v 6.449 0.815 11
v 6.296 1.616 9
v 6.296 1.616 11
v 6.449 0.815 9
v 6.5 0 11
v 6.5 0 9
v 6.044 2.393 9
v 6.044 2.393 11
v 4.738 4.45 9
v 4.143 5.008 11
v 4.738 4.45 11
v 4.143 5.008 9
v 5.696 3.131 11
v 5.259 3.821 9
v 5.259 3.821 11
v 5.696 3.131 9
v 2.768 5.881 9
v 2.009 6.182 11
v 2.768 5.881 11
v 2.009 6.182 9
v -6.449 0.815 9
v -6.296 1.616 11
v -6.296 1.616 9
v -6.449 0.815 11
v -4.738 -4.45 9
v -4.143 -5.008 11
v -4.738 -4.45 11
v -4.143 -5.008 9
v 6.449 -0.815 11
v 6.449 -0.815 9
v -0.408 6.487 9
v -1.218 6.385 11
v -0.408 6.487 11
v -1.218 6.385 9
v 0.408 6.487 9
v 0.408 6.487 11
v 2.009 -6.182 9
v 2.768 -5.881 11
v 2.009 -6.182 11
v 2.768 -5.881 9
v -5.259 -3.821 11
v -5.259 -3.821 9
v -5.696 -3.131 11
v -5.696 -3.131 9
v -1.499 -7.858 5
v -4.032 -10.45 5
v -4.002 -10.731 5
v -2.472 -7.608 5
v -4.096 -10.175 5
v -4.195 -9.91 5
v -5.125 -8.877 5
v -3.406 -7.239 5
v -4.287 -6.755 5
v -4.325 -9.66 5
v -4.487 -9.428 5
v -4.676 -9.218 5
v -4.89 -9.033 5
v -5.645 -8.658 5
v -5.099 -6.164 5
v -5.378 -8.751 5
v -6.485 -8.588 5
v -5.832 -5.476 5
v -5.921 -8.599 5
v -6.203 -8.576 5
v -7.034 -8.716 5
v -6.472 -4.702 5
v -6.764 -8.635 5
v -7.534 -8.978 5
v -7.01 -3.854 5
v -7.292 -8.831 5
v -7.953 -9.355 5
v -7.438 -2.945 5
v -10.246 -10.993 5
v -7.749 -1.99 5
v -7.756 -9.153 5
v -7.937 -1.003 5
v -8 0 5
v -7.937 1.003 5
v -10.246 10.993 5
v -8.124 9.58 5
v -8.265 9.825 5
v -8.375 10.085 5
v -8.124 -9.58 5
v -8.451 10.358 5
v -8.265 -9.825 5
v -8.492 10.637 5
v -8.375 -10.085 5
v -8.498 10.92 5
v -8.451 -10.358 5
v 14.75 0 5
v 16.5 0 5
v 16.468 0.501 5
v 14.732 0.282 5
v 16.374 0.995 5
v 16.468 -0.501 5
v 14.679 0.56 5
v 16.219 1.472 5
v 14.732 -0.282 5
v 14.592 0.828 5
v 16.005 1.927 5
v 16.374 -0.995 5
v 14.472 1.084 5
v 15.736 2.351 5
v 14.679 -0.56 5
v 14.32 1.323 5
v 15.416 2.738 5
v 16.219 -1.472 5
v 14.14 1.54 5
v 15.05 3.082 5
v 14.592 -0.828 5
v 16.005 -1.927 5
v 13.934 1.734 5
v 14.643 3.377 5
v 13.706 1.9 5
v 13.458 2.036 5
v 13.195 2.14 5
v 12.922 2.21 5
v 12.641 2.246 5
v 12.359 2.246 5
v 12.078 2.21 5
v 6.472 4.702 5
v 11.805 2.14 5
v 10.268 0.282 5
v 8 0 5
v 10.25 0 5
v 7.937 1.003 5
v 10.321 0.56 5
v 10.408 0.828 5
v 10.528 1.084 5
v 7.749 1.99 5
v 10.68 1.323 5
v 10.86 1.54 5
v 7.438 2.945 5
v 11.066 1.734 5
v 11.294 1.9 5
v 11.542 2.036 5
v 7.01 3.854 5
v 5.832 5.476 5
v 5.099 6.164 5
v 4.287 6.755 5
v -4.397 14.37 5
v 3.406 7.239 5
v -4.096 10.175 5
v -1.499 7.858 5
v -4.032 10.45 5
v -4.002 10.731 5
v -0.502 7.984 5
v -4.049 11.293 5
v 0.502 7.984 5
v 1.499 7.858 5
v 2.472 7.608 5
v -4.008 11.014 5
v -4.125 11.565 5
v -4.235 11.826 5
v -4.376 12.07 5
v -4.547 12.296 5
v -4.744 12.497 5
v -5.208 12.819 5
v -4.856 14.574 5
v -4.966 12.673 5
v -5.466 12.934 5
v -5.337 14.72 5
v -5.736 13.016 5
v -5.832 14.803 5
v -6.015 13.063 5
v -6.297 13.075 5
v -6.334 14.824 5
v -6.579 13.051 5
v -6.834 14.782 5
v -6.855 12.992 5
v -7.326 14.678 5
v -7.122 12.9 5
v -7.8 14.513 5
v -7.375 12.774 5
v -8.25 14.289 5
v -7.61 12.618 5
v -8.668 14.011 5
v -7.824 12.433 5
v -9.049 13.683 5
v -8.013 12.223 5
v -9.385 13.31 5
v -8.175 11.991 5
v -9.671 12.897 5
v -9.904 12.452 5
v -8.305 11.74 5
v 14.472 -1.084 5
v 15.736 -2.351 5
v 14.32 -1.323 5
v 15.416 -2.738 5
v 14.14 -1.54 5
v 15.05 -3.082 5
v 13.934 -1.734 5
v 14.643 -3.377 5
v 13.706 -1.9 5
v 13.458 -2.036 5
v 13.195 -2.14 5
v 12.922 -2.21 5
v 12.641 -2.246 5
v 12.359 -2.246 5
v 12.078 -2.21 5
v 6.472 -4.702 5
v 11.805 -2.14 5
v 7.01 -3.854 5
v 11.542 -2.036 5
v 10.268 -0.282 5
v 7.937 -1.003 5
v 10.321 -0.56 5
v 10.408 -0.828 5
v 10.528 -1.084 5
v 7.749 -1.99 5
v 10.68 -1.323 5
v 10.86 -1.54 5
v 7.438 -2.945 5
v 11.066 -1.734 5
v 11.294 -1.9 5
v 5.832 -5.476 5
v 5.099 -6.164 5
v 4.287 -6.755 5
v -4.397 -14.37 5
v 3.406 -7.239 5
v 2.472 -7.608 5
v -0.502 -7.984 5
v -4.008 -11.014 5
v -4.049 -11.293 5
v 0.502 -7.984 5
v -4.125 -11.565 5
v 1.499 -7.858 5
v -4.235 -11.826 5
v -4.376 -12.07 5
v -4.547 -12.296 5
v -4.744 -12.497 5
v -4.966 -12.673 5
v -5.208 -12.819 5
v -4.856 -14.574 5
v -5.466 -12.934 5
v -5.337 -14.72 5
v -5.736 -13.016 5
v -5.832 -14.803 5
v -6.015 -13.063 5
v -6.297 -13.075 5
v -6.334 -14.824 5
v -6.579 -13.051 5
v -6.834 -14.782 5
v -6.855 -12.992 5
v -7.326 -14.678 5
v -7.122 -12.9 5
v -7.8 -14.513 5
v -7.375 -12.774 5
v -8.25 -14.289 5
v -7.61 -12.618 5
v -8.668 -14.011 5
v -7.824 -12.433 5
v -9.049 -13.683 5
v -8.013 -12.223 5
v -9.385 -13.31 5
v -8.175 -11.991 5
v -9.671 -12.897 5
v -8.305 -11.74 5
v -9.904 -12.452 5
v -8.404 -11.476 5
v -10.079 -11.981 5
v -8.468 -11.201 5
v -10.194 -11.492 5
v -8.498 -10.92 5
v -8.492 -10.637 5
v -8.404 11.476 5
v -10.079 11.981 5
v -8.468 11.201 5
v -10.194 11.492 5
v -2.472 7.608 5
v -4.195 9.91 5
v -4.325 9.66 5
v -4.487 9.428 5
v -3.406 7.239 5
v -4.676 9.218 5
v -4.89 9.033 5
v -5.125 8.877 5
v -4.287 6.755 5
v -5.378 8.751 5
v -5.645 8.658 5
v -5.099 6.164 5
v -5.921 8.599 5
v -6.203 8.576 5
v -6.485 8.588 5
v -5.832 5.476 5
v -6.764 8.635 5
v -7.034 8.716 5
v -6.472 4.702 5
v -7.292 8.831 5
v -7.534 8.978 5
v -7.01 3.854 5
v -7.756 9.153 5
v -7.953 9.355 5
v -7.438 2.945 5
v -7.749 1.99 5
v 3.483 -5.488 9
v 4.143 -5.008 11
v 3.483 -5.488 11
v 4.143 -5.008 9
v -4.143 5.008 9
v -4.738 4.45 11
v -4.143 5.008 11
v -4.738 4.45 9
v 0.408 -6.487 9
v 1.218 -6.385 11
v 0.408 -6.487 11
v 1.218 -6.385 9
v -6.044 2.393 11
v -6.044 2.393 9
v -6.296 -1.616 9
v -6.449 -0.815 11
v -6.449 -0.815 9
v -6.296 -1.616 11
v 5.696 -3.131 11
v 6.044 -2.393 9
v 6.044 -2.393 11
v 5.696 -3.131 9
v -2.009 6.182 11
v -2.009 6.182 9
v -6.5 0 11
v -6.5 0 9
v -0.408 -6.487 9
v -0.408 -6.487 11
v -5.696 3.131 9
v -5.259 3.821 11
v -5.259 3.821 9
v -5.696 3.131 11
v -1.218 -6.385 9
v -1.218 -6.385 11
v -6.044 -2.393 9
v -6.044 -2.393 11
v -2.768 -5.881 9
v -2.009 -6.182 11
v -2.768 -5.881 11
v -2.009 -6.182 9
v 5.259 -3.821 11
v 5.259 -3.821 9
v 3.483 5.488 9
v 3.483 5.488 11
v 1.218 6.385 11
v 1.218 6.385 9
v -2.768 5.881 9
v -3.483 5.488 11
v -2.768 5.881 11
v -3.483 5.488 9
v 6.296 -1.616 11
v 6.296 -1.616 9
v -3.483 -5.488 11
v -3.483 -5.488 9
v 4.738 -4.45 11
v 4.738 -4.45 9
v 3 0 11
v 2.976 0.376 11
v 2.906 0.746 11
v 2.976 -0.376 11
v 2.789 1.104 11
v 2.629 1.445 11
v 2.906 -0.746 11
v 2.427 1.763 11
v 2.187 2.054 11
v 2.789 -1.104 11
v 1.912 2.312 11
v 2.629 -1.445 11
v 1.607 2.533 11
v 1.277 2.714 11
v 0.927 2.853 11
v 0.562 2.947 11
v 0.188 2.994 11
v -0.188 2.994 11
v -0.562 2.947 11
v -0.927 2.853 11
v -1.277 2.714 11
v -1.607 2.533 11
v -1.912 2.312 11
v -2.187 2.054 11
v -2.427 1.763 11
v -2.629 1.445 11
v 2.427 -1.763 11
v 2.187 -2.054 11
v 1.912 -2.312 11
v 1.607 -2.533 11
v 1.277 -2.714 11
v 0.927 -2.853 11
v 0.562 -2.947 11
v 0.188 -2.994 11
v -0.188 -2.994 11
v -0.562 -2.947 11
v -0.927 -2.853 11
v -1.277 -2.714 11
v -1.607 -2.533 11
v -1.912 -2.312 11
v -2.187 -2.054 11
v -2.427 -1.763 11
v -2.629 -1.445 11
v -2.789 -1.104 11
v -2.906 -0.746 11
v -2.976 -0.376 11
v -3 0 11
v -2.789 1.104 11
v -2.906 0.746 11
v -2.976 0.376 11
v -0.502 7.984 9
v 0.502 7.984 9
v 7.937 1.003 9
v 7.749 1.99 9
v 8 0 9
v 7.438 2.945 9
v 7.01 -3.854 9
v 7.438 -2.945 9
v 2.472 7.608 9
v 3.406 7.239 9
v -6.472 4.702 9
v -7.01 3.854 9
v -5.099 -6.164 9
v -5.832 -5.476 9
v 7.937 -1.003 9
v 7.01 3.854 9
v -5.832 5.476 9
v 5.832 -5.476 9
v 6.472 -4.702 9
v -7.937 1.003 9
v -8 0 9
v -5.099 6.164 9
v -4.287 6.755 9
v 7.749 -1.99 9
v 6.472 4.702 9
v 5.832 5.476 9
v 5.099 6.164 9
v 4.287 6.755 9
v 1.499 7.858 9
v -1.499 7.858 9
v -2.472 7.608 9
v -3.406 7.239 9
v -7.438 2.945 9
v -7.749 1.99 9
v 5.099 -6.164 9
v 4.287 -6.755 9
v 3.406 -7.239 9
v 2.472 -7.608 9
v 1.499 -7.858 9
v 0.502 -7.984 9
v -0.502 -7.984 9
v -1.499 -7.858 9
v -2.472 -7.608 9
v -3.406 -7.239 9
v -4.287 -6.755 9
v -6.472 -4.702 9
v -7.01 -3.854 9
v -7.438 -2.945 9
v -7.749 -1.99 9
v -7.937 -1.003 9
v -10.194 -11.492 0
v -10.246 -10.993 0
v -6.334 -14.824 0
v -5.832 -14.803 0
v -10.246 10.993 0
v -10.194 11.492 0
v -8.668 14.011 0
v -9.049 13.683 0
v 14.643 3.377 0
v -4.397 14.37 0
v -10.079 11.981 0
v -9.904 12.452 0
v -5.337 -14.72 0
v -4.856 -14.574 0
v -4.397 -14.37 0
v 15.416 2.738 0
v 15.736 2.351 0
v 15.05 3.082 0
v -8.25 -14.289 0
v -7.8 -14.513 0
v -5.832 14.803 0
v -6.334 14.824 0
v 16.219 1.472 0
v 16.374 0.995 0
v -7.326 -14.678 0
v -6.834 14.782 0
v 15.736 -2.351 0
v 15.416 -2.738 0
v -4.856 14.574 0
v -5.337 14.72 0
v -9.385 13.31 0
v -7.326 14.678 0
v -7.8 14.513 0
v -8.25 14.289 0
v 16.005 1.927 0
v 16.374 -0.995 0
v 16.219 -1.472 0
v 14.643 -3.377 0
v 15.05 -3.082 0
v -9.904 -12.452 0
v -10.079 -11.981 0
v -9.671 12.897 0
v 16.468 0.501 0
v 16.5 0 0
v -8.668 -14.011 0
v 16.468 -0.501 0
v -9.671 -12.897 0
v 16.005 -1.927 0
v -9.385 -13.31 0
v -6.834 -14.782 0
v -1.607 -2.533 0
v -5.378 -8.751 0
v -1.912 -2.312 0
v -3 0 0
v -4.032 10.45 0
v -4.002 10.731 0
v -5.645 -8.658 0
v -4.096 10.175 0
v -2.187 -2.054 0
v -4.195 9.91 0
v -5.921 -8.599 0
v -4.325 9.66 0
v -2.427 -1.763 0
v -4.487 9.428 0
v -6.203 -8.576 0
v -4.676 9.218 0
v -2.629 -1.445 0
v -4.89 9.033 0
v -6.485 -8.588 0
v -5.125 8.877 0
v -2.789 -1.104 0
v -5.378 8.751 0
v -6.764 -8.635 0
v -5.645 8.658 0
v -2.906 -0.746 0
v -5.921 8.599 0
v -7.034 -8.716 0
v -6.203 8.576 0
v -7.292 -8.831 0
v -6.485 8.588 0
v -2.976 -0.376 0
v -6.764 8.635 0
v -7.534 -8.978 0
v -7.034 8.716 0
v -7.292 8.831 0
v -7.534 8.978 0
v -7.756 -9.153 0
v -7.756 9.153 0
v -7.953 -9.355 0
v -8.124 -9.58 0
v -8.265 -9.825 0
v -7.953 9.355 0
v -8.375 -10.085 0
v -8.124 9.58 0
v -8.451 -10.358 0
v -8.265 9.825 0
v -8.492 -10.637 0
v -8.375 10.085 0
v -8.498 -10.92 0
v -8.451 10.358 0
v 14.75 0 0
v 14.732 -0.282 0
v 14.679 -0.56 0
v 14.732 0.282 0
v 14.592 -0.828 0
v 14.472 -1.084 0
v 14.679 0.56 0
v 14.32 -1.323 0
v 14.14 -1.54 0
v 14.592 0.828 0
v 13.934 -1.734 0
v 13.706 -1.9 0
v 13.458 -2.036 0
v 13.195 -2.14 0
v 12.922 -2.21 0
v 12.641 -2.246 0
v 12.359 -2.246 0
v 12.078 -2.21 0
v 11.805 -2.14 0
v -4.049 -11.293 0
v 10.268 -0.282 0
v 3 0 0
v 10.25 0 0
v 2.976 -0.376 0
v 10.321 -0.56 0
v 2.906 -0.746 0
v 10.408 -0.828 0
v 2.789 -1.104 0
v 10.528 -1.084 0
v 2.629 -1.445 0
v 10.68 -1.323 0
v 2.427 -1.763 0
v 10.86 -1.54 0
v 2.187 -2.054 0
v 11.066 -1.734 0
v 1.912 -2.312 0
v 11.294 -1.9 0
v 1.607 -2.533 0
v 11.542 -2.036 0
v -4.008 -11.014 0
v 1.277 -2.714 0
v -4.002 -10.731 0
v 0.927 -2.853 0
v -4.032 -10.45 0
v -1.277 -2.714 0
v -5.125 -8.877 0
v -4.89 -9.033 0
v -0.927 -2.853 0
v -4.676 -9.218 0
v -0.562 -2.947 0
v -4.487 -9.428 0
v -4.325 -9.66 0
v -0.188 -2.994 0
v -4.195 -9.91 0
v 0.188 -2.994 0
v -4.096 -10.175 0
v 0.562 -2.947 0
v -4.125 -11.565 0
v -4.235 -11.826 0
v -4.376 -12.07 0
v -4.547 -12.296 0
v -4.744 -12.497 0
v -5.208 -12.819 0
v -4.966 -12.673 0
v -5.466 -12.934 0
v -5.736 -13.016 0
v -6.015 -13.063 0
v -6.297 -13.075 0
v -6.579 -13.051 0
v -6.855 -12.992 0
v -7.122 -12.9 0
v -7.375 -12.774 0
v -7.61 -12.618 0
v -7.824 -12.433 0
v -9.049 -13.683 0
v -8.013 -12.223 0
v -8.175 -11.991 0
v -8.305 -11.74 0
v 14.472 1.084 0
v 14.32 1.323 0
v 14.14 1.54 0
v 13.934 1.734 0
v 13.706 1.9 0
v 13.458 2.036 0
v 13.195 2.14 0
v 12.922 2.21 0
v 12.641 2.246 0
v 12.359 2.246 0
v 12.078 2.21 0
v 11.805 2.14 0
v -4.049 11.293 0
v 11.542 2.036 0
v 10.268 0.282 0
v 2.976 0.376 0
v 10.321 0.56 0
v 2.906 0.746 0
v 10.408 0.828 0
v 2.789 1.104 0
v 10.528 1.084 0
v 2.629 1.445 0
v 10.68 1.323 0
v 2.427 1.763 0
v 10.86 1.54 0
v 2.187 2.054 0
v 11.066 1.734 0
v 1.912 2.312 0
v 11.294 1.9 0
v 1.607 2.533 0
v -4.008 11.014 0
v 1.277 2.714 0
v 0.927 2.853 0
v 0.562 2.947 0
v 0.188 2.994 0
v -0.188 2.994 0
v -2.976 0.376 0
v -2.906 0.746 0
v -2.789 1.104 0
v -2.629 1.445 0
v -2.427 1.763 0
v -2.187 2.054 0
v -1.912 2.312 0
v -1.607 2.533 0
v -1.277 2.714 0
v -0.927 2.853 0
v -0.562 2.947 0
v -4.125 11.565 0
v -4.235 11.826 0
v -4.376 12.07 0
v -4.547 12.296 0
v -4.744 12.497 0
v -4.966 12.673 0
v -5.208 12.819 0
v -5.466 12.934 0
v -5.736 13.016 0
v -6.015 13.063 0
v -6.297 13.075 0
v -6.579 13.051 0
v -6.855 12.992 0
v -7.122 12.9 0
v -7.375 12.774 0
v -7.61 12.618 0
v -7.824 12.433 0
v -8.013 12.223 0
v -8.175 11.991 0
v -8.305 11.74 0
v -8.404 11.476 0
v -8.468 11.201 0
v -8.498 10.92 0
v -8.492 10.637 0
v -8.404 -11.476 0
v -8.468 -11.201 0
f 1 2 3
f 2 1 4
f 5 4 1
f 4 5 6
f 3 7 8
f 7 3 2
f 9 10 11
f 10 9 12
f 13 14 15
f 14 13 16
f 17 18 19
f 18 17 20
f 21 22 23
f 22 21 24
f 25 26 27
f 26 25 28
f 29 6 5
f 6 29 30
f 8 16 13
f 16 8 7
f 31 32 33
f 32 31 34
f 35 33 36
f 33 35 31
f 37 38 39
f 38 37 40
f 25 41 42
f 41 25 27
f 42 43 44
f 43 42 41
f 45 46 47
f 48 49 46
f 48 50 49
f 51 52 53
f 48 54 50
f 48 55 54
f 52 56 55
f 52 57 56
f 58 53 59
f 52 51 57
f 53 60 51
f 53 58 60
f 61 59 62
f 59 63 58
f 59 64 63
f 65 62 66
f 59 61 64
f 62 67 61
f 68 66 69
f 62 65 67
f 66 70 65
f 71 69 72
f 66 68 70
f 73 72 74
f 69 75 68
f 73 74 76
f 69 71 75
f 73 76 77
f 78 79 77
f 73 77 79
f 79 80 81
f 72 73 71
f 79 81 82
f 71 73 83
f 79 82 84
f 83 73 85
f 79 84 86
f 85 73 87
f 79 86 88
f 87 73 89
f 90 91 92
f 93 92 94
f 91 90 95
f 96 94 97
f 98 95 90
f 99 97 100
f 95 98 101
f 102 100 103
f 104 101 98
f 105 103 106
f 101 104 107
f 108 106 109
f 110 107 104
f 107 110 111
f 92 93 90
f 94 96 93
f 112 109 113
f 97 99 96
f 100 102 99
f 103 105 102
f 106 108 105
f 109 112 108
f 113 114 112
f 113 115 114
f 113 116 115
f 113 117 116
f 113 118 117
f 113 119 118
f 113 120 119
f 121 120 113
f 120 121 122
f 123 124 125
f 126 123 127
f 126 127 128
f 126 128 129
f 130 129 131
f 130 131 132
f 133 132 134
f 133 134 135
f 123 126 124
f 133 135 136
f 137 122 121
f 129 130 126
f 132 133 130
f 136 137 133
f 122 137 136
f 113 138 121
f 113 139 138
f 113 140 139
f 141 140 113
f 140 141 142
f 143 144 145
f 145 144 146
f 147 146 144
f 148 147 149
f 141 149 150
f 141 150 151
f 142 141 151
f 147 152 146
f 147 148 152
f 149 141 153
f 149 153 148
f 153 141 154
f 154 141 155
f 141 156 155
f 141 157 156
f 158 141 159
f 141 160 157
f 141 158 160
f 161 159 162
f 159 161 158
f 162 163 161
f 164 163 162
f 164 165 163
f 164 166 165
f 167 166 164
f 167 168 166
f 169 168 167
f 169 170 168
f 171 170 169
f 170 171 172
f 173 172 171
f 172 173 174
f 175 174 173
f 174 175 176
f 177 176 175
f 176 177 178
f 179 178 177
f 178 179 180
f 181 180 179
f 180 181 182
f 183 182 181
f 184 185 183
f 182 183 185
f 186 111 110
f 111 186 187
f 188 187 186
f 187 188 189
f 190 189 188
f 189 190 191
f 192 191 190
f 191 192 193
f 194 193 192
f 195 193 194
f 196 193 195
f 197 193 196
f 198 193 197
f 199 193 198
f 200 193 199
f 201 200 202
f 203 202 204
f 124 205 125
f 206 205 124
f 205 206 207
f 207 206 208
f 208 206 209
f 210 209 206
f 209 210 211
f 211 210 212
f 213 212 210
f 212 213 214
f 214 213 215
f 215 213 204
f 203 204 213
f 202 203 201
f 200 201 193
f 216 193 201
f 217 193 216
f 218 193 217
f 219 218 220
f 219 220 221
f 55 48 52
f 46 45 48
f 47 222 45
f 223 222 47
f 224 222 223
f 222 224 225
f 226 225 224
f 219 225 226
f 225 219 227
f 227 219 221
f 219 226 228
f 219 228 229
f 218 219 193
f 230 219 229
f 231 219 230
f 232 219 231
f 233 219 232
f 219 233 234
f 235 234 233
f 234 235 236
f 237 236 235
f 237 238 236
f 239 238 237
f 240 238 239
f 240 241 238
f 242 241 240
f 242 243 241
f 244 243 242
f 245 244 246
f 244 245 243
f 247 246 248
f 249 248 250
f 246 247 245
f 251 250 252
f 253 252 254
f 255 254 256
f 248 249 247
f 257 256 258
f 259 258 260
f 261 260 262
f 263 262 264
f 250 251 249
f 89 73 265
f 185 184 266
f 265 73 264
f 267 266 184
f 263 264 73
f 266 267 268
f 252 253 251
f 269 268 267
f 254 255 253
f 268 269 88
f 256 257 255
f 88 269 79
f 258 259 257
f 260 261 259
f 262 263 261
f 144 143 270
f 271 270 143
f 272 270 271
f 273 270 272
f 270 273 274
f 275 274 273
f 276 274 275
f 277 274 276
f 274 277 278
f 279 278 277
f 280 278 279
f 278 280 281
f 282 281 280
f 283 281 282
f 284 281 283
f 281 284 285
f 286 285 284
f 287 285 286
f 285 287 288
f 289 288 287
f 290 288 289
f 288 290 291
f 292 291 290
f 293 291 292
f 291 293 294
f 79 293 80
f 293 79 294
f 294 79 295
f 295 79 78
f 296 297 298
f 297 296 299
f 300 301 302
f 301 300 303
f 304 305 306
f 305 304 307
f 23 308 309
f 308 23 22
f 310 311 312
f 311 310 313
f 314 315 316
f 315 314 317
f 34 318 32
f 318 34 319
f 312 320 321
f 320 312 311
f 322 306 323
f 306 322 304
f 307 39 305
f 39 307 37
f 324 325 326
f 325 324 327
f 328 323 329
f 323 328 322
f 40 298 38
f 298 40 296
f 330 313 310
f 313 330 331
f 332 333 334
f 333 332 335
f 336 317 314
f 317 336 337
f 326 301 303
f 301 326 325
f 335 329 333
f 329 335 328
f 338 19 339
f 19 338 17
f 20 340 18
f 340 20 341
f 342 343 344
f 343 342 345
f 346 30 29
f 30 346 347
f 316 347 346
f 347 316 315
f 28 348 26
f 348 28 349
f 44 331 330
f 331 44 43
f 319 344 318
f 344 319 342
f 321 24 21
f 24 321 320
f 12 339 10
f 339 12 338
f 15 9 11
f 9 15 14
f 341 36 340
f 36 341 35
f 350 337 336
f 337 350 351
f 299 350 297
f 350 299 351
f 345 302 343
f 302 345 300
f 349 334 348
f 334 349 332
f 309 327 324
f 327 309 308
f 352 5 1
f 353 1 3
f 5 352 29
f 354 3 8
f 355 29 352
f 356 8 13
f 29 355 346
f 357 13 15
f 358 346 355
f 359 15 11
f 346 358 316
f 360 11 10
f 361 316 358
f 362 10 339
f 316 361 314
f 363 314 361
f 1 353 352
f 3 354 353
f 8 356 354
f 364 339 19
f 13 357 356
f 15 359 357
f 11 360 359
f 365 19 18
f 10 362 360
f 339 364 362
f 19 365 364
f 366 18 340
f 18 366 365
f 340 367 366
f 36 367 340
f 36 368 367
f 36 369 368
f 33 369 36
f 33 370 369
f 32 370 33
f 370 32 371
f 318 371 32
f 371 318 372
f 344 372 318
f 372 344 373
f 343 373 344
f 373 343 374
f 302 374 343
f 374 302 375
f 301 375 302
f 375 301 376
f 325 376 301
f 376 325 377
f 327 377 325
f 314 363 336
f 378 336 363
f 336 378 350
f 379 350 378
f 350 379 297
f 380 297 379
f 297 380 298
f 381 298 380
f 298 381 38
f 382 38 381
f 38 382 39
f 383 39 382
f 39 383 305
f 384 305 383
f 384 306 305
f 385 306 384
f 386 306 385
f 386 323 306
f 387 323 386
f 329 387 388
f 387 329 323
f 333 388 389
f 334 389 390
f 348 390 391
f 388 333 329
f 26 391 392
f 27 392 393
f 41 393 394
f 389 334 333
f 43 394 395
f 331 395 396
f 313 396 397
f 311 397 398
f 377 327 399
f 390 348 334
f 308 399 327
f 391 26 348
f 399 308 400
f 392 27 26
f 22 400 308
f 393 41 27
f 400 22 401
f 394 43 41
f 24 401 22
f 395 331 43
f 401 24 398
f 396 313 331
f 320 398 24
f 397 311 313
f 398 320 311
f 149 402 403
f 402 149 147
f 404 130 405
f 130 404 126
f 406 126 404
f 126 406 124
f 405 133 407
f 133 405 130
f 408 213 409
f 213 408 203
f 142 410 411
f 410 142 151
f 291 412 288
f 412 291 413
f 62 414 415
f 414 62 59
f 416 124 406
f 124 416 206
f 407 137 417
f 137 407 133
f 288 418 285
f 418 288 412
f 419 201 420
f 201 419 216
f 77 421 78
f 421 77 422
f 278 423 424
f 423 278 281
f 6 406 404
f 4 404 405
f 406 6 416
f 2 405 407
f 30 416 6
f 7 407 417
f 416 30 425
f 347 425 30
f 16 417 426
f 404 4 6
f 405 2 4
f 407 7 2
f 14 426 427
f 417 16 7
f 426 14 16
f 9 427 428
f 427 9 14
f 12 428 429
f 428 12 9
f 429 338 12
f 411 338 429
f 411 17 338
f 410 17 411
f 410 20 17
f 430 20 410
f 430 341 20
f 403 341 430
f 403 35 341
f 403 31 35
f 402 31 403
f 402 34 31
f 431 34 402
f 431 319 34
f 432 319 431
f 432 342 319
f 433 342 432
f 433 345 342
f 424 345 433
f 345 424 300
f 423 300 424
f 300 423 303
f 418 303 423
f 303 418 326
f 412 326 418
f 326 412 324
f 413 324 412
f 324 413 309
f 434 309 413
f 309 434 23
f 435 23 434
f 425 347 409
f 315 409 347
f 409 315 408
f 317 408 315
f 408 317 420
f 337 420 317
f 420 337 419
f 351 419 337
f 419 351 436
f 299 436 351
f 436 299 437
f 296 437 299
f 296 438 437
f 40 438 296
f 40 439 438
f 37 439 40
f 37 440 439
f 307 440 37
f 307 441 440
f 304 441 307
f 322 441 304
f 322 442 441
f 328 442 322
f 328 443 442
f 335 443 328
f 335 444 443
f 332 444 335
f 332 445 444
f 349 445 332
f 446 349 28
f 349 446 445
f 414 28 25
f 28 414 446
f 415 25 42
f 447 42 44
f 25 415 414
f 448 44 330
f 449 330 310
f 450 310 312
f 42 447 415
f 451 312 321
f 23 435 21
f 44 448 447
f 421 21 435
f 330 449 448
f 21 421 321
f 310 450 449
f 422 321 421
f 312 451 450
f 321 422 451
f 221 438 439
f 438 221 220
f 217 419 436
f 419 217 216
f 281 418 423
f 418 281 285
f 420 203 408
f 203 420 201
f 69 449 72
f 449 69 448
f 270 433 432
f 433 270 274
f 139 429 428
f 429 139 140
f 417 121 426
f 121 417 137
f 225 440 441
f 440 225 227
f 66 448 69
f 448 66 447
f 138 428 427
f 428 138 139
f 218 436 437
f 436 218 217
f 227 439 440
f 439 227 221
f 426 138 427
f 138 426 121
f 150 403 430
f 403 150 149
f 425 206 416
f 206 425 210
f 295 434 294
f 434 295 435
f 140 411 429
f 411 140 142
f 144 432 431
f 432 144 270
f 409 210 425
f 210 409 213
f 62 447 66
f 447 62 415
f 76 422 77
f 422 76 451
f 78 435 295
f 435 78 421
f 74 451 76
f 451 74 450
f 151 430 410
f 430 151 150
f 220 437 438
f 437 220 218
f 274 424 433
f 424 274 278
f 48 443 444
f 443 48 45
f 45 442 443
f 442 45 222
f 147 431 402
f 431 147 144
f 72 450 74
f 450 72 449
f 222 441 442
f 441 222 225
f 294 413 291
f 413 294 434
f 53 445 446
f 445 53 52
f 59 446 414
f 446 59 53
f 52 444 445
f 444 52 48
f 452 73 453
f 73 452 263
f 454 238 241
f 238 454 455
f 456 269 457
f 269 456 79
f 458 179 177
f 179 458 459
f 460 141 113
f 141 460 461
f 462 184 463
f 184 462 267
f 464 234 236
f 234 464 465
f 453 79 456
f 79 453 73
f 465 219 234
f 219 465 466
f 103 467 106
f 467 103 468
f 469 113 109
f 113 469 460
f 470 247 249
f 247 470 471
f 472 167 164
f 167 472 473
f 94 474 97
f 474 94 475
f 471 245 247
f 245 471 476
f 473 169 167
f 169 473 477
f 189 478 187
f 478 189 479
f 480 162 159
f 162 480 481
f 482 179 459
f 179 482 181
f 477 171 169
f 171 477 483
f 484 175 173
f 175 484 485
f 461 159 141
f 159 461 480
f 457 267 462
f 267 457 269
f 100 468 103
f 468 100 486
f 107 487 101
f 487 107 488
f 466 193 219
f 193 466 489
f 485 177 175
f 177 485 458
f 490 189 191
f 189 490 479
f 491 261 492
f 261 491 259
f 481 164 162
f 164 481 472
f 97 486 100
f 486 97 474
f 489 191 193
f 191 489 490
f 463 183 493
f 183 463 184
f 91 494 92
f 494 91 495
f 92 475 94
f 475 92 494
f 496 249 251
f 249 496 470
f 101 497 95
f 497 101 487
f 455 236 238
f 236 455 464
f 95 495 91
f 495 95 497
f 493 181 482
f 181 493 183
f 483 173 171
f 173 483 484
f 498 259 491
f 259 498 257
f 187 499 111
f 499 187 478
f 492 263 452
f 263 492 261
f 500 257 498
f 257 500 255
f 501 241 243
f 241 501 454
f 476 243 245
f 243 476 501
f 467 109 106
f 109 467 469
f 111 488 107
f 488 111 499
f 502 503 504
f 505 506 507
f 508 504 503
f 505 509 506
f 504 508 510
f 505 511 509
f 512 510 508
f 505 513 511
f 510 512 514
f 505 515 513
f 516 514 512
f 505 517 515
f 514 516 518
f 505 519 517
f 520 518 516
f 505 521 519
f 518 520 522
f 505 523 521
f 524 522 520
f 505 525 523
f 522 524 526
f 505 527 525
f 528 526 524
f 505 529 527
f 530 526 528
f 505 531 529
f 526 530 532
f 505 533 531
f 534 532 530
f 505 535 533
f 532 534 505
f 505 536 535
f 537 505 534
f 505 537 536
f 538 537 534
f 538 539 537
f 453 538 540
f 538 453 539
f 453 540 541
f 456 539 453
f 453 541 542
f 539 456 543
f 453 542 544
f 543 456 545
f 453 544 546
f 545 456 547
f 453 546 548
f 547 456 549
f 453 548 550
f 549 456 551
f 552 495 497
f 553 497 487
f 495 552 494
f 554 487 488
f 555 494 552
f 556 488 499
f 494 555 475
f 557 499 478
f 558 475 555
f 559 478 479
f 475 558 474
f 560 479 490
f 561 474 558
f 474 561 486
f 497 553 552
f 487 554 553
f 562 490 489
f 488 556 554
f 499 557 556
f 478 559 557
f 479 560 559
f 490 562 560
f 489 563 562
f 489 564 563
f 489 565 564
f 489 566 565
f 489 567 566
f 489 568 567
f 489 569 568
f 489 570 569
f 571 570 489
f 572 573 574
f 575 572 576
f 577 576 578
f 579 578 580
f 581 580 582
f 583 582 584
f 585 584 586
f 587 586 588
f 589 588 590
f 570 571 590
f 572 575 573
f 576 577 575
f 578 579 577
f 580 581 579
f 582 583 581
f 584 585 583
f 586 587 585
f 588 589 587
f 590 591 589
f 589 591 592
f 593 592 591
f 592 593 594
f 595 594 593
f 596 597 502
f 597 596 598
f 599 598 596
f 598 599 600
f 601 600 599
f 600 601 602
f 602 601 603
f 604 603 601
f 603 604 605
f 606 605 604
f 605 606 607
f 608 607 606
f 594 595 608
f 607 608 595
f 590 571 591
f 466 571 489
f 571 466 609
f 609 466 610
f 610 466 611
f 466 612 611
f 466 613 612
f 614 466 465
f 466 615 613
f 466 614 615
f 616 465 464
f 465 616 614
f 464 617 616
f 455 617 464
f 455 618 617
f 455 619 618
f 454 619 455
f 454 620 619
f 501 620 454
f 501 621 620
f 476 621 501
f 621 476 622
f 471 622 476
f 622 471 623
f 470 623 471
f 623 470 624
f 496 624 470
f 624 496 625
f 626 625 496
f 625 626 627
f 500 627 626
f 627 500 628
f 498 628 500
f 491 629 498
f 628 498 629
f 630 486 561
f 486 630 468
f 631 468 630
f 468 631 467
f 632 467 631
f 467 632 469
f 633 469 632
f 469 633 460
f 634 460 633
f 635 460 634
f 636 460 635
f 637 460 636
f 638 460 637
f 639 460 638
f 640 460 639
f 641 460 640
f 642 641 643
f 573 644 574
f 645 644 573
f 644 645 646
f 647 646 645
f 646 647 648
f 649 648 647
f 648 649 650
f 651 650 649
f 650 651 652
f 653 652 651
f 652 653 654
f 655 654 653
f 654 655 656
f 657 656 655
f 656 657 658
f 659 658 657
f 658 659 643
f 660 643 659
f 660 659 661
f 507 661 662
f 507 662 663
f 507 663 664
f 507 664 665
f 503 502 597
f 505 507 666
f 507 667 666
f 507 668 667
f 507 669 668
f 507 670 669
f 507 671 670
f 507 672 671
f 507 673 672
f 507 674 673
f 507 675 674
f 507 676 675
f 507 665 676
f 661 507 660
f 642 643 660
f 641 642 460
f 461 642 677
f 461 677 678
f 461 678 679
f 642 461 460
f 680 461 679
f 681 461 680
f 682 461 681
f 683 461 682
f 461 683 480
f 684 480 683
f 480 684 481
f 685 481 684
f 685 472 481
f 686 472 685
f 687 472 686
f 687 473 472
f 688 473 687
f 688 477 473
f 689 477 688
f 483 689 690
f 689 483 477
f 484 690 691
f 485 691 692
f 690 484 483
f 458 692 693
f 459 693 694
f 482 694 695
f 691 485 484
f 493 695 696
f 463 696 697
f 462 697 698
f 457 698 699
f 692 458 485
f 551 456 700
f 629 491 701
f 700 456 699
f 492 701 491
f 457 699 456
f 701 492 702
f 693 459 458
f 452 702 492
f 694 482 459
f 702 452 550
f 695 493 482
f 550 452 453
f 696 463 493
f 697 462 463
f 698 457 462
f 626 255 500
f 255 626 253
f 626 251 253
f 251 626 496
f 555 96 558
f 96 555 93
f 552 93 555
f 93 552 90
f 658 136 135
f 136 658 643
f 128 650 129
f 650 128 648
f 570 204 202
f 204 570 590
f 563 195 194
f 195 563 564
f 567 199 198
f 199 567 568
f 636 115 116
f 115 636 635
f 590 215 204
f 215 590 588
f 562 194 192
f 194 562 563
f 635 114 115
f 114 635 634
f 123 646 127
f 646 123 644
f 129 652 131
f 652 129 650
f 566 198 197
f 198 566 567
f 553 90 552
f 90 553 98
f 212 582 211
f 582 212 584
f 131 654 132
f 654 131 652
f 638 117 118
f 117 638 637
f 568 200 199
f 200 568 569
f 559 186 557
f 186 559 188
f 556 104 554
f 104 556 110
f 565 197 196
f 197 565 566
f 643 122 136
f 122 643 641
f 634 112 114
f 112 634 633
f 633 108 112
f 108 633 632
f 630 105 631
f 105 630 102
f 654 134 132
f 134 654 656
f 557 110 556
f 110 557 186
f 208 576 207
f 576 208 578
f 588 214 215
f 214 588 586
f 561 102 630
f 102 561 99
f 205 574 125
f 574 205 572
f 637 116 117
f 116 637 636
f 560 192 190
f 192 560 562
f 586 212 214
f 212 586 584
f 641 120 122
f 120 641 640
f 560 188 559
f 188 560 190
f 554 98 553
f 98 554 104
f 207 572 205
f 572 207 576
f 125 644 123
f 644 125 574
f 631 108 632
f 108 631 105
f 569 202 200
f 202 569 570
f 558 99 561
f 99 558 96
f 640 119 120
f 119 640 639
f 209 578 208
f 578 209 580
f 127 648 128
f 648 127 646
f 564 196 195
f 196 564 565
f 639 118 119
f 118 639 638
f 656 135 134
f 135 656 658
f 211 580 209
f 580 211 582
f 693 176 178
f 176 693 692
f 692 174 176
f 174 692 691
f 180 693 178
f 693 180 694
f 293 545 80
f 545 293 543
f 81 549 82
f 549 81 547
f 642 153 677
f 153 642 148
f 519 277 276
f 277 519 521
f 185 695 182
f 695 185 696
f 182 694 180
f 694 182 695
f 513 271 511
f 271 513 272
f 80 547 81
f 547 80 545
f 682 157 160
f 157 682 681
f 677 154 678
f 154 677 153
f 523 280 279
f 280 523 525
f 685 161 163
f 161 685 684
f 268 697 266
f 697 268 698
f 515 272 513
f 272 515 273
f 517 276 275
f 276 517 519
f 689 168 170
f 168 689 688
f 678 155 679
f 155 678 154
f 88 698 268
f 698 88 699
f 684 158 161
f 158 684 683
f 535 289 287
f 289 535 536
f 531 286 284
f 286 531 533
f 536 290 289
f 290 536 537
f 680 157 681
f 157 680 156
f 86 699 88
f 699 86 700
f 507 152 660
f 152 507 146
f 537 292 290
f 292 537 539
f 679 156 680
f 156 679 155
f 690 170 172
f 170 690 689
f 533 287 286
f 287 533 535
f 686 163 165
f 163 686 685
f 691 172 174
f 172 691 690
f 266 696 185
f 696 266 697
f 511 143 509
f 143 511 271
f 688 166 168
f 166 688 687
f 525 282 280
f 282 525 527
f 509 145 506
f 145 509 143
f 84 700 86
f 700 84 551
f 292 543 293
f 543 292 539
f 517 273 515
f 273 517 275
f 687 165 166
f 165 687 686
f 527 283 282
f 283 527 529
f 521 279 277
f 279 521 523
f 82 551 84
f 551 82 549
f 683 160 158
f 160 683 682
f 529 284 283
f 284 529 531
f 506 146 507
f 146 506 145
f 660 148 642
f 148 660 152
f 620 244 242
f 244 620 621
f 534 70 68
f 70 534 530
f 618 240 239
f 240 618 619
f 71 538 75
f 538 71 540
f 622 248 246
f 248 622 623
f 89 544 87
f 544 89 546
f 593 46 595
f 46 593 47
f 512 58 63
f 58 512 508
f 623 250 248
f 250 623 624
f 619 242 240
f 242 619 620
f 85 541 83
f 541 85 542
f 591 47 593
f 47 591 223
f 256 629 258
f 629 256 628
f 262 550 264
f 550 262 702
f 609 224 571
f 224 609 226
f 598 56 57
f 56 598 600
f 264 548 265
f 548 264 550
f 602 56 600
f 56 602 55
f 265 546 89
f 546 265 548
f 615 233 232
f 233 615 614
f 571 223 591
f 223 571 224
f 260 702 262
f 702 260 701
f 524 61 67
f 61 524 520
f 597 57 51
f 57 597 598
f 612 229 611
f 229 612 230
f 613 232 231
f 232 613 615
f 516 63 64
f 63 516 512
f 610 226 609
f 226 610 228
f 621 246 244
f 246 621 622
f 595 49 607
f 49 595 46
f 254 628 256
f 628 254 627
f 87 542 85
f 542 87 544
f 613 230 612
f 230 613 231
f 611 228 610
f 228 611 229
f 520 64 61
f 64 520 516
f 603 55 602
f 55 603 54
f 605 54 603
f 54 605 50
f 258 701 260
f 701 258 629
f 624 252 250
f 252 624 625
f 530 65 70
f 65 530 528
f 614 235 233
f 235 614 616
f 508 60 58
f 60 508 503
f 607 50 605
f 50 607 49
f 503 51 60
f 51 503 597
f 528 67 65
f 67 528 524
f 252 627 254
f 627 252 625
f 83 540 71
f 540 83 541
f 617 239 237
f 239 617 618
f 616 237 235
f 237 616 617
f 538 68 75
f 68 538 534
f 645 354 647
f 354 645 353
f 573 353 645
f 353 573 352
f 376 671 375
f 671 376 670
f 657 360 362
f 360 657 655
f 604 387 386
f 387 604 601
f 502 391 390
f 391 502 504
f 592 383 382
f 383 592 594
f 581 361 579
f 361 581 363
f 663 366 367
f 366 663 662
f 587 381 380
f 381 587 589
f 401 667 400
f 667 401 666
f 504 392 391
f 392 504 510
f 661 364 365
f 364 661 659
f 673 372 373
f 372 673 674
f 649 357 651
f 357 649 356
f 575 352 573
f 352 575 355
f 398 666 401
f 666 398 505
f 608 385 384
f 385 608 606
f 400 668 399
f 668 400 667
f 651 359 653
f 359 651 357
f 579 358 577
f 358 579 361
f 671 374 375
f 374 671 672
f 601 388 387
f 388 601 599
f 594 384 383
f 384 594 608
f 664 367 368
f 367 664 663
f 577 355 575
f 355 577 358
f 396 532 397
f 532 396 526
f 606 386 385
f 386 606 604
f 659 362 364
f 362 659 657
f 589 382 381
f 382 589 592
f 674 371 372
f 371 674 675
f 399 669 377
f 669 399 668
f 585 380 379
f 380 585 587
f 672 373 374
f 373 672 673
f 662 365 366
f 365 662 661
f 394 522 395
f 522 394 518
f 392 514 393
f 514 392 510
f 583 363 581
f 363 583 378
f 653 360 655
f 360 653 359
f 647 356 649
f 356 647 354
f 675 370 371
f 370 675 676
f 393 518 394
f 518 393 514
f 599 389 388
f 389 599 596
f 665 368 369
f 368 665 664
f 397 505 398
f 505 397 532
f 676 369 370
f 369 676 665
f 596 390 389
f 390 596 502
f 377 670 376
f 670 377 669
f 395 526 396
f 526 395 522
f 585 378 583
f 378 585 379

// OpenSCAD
MOUNT_HOLES = 3;
MOUNT_HOLE_DIA = 4.5;
MOUNT_HOLE_HEAD_DIA = 8;
MOUNT_HOLE_SPACING = 25/2;

MOUNT_THICKNESS = 5;

CENTER_HOLE_DIA = 6;
PLATFORM_THICKNESS = 6;

NUB_LIP_DIA = 13;
NUB_LIP_THICKNESS = PLATFORM_THICKNESS;
NUB_DIA = 16;
NUB_THICKNESS = NUB_LIP_THICKNESS - 2;

ACCESSORY_MOUNT_HOLE_DIA = 2;
ACCESSORY_MOUNT_HOLE_SPACING_X = 24/2;
ACCESSORY_MOUNT_HOLE_SPACING_Y = 10;

$fn = 50;

module mount() {
  difference() {
    union() {
      hull() {
        for(i = [0:MOUNT_HOLES-1]) {
          rotate([0, 0, i * 120])
          translate([MOUNT_HOLE_SPACING, 0, 0])
          cylinder(d = MOUNT_HOLE_HEAD_DIA, h = MOUNT_THICKNESS);
        }
      }
      translate([0, 0, MOUNT_THICKNESS]) {
        cylinder(d = NUB_LIP_DIA, h = NUB_LIP_THICKNESS);
        cylinder(d = NUB_DIA, h = NUB_THICKNESS);
      }
    }

    for(i = [0:MOUNT_HOLES-1]) {
      rotate([0, 0, i * 120])
      translate([MOUNT_HOLE_SPACING, 0, 0])
      cylinder(d = MOUNT_HOLE_DIA, h = MOUNT_THICKNESS);
    }
    cylinder(d = CENTER_HOLE_DIA, h = MOUNT_THICKNESS + NUB_LIP_THICKNESS);

    for(i = [0:MOUNT_HOLES-1]) {
      rotate([0, 0, i * 120 + 60]) {
        translate([ACCESSORY_MOUNT_HOLE_SPACING_X, -ACCESSORY_MOUNT_HOLE_SPACING_Y/2, 0])
        cylinder(d = ACCESSORY_MOUNT_HOLE_DIA, h = MOUNT_THICKNESS);
        translate([ACCESSORY_MOUNT_HOLE_SPACING_X, ACCESSORY_MOUNT_HOLE_SPACING_Y/2, 0])
        cylinder(d = ACCESSORY_MOUNT_HOLE_DIA, h = MOUNT_THICKNESS);
      }
    }
  }
}

mount();
